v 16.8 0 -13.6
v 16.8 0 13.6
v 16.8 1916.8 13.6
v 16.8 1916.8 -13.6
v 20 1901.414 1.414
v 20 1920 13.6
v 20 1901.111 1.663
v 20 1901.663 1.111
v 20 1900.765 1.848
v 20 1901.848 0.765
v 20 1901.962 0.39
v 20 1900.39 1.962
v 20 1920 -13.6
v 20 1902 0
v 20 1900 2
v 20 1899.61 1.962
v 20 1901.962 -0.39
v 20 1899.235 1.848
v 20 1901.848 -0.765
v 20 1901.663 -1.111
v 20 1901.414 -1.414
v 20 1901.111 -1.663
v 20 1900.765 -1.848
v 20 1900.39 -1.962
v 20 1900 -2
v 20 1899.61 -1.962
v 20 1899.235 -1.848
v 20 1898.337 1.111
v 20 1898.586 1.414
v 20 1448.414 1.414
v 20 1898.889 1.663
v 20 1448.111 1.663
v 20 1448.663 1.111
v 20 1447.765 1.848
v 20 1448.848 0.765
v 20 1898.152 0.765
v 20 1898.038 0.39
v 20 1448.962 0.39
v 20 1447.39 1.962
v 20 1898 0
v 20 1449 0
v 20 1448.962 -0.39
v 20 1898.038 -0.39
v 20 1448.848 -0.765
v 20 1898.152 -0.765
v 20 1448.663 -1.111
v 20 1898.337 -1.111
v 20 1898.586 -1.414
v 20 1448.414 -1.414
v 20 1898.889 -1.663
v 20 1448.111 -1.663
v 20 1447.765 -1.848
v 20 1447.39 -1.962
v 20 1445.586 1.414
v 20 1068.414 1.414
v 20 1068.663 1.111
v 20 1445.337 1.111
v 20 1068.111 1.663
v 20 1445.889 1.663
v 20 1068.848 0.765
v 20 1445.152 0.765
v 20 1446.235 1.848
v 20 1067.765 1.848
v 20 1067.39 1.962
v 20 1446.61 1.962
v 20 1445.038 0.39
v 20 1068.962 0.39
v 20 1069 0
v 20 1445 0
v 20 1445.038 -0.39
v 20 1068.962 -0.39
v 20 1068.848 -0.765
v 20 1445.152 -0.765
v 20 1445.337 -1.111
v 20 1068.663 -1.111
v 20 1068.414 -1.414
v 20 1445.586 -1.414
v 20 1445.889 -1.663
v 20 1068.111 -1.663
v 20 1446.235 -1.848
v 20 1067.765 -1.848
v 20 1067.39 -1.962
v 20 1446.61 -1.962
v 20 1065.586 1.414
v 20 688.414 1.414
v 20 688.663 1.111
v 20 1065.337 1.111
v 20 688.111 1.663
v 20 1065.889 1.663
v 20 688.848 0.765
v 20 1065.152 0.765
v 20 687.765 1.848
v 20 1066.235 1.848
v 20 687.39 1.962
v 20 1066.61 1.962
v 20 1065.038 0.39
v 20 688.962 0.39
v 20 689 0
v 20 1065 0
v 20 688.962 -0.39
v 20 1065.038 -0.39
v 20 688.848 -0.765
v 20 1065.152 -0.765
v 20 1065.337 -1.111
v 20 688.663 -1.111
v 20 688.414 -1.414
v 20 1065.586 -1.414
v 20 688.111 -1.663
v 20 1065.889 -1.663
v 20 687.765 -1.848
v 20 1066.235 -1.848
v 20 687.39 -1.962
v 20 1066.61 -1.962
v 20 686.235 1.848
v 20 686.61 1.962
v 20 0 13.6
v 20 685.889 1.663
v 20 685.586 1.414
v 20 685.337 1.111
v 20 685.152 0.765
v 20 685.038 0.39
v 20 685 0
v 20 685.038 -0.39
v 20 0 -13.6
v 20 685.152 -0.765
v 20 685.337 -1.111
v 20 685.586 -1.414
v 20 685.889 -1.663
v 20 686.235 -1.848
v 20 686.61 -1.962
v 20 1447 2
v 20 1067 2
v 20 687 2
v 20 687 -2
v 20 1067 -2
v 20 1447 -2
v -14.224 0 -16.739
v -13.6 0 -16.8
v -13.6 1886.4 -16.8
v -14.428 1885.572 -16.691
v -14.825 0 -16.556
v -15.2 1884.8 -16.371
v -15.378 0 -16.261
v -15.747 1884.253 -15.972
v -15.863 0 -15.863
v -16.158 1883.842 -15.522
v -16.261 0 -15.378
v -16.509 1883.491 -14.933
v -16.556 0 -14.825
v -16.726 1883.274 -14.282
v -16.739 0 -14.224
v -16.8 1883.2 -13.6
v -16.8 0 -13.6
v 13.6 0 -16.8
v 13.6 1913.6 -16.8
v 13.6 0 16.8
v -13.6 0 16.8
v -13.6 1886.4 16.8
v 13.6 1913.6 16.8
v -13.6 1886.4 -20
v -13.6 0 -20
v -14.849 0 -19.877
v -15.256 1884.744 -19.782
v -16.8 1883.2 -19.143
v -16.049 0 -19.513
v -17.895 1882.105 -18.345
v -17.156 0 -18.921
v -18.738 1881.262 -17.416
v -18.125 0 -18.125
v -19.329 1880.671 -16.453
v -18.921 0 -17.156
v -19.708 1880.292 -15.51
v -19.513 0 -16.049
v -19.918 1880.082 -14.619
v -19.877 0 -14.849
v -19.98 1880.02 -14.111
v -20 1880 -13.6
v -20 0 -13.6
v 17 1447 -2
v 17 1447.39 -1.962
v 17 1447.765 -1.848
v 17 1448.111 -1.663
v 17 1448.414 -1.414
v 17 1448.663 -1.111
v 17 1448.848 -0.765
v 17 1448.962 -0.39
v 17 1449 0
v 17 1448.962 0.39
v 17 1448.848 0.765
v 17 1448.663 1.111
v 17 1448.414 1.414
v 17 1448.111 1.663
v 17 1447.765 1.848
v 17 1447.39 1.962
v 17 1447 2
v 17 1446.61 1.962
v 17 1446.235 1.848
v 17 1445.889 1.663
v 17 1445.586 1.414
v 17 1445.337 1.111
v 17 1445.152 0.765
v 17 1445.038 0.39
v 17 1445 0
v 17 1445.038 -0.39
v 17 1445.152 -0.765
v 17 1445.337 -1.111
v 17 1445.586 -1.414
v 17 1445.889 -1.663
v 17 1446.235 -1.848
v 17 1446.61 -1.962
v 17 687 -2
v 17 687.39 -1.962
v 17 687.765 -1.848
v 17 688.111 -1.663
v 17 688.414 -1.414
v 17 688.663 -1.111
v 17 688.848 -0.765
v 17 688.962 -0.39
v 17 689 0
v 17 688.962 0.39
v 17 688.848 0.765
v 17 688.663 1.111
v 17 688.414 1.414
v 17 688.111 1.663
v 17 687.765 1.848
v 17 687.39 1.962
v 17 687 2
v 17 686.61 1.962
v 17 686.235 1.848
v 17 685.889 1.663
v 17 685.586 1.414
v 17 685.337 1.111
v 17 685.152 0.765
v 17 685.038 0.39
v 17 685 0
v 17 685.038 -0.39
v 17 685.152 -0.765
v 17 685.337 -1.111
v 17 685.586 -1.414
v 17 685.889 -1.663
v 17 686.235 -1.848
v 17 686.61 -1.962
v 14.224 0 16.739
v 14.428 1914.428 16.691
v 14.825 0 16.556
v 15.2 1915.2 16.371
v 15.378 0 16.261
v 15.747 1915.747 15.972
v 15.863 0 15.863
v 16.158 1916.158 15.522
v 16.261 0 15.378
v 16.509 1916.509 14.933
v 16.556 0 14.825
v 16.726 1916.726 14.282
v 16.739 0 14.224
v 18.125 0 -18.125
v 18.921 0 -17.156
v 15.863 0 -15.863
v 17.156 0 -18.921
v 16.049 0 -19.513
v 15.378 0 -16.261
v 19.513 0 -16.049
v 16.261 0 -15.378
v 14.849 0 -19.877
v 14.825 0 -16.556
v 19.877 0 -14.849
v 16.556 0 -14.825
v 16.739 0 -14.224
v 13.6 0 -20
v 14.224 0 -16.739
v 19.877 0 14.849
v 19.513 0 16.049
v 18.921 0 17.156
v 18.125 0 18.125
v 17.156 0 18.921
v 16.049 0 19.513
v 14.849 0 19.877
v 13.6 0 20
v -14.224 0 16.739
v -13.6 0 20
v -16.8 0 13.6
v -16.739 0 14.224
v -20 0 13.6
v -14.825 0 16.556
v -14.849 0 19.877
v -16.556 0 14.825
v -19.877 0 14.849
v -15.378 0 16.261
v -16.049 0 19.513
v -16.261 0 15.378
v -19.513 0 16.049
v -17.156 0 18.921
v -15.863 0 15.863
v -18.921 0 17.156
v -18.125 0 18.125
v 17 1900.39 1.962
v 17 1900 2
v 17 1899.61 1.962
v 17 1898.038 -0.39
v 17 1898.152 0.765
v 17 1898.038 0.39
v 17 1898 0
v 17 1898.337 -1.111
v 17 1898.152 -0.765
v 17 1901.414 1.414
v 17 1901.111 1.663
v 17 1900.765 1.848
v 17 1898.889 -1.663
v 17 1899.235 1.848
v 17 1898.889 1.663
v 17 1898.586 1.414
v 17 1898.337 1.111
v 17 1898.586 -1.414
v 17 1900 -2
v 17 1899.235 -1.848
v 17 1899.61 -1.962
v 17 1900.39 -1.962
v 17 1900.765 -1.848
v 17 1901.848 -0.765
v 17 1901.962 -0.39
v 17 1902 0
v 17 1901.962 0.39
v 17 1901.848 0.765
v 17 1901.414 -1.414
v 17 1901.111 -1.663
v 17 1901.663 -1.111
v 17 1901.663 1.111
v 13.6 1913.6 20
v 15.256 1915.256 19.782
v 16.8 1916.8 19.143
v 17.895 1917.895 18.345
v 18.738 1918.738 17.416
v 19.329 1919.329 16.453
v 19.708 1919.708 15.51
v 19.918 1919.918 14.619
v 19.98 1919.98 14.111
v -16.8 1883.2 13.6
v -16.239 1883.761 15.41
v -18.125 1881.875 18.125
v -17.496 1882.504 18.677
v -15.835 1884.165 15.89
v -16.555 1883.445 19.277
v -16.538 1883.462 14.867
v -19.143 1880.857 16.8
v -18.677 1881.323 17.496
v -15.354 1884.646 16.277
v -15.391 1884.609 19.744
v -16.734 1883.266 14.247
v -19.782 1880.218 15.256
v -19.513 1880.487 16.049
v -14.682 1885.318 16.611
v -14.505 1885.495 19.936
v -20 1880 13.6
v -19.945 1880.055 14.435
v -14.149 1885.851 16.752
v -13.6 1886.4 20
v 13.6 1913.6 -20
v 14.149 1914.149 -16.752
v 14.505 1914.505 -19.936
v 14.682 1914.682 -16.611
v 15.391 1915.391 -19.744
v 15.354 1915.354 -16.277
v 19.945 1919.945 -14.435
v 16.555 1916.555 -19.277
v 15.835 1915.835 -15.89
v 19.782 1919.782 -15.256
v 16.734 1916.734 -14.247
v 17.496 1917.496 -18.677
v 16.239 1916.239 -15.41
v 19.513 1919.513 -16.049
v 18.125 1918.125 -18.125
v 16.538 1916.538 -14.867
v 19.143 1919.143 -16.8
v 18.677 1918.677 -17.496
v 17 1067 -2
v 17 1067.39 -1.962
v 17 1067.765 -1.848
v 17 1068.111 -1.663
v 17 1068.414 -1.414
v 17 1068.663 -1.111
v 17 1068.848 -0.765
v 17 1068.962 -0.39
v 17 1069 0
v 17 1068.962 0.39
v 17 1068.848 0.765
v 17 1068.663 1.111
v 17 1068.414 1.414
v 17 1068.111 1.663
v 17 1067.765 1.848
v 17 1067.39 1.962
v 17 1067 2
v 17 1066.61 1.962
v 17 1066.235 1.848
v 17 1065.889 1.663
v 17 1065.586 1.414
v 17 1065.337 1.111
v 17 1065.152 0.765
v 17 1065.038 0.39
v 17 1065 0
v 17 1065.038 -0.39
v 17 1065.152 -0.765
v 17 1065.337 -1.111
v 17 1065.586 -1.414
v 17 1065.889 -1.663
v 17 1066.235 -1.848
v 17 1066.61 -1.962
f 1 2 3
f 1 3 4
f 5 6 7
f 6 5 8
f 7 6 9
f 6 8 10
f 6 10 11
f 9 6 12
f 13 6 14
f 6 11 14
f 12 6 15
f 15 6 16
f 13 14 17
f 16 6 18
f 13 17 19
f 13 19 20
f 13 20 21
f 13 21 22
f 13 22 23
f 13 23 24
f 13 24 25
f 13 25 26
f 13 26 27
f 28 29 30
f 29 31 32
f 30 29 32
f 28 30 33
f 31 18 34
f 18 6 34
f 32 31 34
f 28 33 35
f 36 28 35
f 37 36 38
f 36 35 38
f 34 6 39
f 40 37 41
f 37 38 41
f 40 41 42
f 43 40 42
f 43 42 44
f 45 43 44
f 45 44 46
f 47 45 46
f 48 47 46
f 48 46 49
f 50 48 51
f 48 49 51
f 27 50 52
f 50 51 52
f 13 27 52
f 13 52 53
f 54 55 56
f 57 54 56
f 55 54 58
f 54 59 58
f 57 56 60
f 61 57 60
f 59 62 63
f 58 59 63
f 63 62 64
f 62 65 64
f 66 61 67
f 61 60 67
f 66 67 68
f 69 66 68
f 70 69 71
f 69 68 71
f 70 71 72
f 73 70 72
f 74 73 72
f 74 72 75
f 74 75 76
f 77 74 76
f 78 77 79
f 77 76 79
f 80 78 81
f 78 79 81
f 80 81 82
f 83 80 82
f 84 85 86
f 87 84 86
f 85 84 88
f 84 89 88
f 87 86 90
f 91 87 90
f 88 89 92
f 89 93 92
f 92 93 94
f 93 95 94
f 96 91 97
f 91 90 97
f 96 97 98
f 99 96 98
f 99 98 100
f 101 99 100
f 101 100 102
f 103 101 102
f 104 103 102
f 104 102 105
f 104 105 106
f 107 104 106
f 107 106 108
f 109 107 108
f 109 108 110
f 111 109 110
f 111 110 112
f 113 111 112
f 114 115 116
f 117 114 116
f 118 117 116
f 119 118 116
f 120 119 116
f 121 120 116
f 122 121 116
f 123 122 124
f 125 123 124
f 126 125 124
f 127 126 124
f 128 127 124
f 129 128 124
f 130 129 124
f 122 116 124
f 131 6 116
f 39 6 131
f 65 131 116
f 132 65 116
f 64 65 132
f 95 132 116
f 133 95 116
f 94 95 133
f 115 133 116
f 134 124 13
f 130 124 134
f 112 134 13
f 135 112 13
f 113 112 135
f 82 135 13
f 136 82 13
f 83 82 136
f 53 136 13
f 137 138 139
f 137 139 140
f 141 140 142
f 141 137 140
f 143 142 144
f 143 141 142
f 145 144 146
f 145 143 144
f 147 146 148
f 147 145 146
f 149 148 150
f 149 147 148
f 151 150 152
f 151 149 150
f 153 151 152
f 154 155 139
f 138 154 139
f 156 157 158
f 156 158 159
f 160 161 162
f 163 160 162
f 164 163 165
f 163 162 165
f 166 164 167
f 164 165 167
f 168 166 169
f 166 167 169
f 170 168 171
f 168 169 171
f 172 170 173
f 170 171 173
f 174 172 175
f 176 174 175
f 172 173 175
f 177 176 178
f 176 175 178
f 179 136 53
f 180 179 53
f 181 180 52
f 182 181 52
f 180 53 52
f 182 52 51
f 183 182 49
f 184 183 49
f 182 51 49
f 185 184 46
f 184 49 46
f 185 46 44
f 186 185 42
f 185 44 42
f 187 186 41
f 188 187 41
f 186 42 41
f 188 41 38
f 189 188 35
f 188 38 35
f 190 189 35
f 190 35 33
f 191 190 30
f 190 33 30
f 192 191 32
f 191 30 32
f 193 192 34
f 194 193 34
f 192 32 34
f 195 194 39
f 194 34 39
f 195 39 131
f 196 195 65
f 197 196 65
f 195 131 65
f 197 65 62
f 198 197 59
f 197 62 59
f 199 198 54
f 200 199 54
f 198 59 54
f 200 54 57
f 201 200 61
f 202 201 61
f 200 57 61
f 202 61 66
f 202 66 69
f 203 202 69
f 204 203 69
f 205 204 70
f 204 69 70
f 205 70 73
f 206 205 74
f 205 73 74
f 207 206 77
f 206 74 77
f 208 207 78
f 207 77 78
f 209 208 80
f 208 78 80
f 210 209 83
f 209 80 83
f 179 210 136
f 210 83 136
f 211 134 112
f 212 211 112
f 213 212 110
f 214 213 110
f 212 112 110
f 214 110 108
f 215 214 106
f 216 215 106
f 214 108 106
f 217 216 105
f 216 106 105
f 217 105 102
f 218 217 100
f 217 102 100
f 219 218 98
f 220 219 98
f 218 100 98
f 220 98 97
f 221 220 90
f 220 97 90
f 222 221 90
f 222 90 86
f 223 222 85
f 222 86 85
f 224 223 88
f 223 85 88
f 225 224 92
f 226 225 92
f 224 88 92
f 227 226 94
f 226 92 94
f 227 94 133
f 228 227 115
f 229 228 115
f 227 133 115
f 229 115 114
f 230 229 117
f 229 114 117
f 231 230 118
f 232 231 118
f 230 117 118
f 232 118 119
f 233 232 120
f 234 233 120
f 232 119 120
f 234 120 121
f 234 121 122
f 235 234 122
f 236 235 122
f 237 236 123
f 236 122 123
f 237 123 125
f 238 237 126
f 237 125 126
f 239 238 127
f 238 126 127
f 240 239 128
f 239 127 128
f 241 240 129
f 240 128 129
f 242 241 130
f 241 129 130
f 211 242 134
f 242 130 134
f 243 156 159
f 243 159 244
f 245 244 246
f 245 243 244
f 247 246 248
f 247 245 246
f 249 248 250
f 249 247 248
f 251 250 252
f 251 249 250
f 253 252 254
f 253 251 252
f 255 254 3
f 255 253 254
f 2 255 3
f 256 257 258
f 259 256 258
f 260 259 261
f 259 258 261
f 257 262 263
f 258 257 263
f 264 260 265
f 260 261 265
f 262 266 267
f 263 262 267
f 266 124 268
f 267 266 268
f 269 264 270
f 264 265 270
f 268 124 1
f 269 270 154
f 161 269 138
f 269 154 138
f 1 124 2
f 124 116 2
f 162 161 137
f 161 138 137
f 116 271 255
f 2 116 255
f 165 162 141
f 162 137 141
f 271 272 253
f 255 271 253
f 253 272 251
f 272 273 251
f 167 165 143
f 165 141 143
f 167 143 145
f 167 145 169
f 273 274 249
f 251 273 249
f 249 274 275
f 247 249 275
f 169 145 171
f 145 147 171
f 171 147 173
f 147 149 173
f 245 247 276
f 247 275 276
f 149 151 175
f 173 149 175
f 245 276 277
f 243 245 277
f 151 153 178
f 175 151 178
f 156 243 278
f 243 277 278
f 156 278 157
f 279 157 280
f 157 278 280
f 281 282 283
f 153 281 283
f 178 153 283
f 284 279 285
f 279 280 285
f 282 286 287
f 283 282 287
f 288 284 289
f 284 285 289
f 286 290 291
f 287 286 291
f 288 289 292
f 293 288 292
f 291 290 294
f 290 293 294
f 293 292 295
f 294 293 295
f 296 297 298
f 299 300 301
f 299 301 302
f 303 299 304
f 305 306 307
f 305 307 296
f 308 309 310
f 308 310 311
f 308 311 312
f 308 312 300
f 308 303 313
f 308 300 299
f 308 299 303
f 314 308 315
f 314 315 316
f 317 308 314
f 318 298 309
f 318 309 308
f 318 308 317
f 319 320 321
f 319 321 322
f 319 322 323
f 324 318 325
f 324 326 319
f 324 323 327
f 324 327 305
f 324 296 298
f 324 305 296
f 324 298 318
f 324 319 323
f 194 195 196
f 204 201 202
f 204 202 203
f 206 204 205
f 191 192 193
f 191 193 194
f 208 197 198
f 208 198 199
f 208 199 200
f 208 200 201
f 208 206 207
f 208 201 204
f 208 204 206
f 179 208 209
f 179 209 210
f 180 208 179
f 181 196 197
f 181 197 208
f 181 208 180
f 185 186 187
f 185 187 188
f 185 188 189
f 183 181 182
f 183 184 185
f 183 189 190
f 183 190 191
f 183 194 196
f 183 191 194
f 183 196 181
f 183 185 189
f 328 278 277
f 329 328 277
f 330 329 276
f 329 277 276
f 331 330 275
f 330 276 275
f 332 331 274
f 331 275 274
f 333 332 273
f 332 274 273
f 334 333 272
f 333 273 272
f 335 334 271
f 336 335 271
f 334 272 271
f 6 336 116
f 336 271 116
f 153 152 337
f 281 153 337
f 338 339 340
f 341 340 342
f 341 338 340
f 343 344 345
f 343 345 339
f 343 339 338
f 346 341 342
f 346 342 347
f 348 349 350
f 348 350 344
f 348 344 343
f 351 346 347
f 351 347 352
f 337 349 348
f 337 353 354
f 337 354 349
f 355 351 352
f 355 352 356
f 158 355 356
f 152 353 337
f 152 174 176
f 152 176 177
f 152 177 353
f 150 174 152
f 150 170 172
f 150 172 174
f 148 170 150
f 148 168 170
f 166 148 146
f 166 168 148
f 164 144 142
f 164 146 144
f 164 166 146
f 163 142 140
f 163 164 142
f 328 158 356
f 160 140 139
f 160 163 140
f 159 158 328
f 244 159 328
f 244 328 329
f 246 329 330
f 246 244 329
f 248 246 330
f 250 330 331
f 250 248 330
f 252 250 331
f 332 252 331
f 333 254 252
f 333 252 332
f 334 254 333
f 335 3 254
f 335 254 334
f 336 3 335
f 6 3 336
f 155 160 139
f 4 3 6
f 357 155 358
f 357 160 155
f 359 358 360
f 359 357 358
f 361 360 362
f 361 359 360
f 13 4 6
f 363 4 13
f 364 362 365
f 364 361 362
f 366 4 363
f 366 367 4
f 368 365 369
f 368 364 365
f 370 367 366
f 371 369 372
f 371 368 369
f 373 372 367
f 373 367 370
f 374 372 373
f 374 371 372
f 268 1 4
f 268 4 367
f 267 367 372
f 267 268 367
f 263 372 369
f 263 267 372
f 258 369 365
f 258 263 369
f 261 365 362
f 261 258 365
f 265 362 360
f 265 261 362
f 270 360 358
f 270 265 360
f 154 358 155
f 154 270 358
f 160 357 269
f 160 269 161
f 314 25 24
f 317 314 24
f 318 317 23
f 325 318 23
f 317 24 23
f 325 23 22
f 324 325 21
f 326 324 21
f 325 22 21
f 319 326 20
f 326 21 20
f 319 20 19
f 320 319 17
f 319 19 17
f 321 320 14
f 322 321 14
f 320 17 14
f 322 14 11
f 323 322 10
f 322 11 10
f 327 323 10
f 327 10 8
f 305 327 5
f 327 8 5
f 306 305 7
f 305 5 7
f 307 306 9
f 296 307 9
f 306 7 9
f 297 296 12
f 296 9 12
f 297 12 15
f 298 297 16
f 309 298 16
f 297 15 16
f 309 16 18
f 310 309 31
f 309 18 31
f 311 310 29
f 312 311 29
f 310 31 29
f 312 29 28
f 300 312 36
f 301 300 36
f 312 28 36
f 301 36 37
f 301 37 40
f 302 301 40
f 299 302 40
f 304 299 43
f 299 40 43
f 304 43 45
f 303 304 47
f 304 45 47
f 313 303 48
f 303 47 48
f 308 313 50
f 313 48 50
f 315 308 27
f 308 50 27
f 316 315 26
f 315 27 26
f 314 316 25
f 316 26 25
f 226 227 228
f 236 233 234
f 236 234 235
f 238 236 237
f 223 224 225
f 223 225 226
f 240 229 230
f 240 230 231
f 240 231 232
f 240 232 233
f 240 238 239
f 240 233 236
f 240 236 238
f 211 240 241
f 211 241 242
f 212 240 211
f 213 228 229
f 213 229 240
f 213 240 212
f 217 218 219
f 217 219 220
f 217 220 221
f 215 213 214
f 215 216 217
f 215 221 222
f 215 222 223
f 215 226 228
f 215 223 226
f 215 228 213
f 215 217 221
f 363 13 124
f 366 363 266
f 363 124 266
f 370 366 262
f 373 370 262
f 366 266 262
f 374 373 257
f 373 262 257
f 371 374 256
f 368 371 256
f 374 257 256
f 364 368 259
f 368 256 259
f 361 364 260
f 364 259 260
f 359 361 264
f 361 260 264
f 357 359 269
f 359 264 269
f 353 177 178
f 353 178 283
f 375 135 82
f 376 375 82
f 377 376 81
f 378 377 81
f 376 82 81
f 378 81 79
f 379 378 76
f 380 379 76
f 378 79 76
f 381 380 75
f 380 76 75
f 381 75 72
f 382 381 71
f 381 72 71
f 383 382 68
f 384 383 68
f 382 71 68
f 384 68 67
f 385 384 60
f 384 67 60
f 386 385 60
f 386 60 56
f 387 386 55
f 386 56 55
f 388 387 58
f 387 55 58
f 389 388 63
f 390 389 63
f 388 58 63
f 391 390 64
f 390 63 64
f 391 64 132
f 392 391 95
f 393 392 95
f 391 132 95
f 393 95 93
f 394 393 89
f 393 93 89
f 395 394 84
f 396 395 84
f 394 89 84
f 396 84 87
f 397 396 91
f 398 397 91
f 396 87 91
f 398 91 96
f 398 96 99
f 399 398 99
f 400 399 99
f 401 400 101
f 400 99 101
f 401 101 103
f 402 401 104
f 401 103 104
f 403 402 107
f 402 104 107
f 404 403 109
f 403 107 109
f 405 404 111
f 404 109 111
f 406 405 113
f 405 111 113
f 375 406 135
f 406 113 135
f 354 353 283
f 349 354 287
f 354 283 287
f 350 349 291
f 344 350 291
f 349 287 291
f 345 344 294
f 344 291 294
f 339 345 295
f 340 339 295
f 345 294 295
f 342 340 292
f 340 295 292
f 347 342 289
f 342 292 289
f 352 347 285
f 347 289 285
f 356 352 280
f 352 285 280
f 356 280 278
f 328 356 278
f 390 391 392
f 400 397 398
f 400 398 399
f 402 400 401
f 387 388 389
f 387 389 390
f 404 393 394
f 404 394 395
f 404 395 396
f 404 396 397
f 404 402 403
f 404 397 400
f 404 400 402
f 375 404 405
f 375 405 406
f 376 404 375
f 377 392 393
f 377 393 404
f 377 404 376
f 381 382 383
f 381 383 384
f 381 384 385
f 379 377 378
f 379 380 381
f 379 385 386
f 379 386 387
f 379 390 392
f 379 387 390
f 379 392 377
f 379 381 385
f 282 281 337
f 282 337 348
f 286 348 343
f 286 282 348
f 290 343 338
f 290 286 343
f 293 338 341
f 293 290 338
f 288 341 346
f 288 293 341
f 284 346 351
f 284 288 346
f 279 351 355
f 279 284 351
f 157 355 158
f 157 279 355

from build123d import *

# Parameters (mm, degrees)
TUBE_SQUARE_40_X_40_X_3_2_1_DEPTH = 1920
CUT_EXTRUDE1_DEPTH                = 1921.52076271
SKETCH16_R                        = 2
CUT_EXTRUDE2_DEPTH                = 3


with BuildPart() as part:
    # Sketch15 → Tube (square) 40 X 40 X 3.2(1) (new body)
    with BuildSketch(Plane(origin=(0, 0, 0), x_dir=(-1, 0, 0), z_dir=(0, 1, 0))):
        with BuildLine():
            Line((-13.6, -20), (13.6, -20))
            ThreePointArc((13.6, -20), (18.1254834, -18.1254834), (20, -13.6))
            Line((20, -13.6), (20, 13.6))
            ThreePointArc((20, 13.6), (18.1254834, 18.1254834), (13.6, 20))
            Line((13.6, 20), (-13.6, 20))
            ThreePointArc((-13.6, 20), (-18.1254834, 18.1254834), (-20, 13.6))
            Line((-20, 13.6), (-20, -13.6))
            ThreePointArc((-20, -13.6), (-18.1254834, -18.1254834), (-13.6, -20))
        make_face()
        with BuildLine():
            Line((-13.6, -16.8), (13.6, -16.8))
            ThreePointArc((13.6, -16.8), (15.8627417, -15.8627417), (16.8, -13.6))
            Line((16.8, -13.6), (16.8, 13.6))
            ThreePointArc((16.8, 13.6), (15.8627417, 15.8627417), (13.6, 16.8))
            Line((13.6, 16.8), (-13.6, 16.8))
            ThreePointArc((-13.6, 16.8), (-15.8627417, 15.8627417), (-16.8, 13.6))
            Line((-16.8, 13.6), (-16.8, -13.6))
            ThreePointArc((-16.8, -13.6), (-15.8627417, -15.8627417), (-13.6, -16.8))
        make_face(mode=Mode.SUBTRACT)
    extrude(amount=TUBE_SQUARE_40_X_40_X_3_2_1_DEPTH)

    # Sketch13 → Cut-Extrude1 (cut, through all)
    with BuildSketch(Plane(origin=(0, 0, -20), x_dir=(-1, 0, 0), z_dir=(0, 0, -1))):
        Polygon((20, 1880), (-20, 1920), (20, 1920), align=None)
    extrude(amount=-CUT_EXTRUDE1_DEPTH, mode=Mode.SUBTRACT)

    # Sketch16 → Cut-Extrude2 (cut)
    with BuildSketch(Plane(origin=(20, 0, 0), x_dir=(0, 0, -1), z_dir=(1, 0, 0))):
        with Locations((0, 1900)):
            Circle(SKETCH16_R)
        with Locations((0, 1447)):
            Circle(SKETCH16_R)
        with Locations((0, 1067)):
            Circle(SKETCH16_R)
        with Locations((0, 687)):
            Circle(SKETCH16_R)
    extrude(amount=-CUT_EXTRUDE2_DEPTH, mode=Mode.SUBTRACT)


solid = part.part
